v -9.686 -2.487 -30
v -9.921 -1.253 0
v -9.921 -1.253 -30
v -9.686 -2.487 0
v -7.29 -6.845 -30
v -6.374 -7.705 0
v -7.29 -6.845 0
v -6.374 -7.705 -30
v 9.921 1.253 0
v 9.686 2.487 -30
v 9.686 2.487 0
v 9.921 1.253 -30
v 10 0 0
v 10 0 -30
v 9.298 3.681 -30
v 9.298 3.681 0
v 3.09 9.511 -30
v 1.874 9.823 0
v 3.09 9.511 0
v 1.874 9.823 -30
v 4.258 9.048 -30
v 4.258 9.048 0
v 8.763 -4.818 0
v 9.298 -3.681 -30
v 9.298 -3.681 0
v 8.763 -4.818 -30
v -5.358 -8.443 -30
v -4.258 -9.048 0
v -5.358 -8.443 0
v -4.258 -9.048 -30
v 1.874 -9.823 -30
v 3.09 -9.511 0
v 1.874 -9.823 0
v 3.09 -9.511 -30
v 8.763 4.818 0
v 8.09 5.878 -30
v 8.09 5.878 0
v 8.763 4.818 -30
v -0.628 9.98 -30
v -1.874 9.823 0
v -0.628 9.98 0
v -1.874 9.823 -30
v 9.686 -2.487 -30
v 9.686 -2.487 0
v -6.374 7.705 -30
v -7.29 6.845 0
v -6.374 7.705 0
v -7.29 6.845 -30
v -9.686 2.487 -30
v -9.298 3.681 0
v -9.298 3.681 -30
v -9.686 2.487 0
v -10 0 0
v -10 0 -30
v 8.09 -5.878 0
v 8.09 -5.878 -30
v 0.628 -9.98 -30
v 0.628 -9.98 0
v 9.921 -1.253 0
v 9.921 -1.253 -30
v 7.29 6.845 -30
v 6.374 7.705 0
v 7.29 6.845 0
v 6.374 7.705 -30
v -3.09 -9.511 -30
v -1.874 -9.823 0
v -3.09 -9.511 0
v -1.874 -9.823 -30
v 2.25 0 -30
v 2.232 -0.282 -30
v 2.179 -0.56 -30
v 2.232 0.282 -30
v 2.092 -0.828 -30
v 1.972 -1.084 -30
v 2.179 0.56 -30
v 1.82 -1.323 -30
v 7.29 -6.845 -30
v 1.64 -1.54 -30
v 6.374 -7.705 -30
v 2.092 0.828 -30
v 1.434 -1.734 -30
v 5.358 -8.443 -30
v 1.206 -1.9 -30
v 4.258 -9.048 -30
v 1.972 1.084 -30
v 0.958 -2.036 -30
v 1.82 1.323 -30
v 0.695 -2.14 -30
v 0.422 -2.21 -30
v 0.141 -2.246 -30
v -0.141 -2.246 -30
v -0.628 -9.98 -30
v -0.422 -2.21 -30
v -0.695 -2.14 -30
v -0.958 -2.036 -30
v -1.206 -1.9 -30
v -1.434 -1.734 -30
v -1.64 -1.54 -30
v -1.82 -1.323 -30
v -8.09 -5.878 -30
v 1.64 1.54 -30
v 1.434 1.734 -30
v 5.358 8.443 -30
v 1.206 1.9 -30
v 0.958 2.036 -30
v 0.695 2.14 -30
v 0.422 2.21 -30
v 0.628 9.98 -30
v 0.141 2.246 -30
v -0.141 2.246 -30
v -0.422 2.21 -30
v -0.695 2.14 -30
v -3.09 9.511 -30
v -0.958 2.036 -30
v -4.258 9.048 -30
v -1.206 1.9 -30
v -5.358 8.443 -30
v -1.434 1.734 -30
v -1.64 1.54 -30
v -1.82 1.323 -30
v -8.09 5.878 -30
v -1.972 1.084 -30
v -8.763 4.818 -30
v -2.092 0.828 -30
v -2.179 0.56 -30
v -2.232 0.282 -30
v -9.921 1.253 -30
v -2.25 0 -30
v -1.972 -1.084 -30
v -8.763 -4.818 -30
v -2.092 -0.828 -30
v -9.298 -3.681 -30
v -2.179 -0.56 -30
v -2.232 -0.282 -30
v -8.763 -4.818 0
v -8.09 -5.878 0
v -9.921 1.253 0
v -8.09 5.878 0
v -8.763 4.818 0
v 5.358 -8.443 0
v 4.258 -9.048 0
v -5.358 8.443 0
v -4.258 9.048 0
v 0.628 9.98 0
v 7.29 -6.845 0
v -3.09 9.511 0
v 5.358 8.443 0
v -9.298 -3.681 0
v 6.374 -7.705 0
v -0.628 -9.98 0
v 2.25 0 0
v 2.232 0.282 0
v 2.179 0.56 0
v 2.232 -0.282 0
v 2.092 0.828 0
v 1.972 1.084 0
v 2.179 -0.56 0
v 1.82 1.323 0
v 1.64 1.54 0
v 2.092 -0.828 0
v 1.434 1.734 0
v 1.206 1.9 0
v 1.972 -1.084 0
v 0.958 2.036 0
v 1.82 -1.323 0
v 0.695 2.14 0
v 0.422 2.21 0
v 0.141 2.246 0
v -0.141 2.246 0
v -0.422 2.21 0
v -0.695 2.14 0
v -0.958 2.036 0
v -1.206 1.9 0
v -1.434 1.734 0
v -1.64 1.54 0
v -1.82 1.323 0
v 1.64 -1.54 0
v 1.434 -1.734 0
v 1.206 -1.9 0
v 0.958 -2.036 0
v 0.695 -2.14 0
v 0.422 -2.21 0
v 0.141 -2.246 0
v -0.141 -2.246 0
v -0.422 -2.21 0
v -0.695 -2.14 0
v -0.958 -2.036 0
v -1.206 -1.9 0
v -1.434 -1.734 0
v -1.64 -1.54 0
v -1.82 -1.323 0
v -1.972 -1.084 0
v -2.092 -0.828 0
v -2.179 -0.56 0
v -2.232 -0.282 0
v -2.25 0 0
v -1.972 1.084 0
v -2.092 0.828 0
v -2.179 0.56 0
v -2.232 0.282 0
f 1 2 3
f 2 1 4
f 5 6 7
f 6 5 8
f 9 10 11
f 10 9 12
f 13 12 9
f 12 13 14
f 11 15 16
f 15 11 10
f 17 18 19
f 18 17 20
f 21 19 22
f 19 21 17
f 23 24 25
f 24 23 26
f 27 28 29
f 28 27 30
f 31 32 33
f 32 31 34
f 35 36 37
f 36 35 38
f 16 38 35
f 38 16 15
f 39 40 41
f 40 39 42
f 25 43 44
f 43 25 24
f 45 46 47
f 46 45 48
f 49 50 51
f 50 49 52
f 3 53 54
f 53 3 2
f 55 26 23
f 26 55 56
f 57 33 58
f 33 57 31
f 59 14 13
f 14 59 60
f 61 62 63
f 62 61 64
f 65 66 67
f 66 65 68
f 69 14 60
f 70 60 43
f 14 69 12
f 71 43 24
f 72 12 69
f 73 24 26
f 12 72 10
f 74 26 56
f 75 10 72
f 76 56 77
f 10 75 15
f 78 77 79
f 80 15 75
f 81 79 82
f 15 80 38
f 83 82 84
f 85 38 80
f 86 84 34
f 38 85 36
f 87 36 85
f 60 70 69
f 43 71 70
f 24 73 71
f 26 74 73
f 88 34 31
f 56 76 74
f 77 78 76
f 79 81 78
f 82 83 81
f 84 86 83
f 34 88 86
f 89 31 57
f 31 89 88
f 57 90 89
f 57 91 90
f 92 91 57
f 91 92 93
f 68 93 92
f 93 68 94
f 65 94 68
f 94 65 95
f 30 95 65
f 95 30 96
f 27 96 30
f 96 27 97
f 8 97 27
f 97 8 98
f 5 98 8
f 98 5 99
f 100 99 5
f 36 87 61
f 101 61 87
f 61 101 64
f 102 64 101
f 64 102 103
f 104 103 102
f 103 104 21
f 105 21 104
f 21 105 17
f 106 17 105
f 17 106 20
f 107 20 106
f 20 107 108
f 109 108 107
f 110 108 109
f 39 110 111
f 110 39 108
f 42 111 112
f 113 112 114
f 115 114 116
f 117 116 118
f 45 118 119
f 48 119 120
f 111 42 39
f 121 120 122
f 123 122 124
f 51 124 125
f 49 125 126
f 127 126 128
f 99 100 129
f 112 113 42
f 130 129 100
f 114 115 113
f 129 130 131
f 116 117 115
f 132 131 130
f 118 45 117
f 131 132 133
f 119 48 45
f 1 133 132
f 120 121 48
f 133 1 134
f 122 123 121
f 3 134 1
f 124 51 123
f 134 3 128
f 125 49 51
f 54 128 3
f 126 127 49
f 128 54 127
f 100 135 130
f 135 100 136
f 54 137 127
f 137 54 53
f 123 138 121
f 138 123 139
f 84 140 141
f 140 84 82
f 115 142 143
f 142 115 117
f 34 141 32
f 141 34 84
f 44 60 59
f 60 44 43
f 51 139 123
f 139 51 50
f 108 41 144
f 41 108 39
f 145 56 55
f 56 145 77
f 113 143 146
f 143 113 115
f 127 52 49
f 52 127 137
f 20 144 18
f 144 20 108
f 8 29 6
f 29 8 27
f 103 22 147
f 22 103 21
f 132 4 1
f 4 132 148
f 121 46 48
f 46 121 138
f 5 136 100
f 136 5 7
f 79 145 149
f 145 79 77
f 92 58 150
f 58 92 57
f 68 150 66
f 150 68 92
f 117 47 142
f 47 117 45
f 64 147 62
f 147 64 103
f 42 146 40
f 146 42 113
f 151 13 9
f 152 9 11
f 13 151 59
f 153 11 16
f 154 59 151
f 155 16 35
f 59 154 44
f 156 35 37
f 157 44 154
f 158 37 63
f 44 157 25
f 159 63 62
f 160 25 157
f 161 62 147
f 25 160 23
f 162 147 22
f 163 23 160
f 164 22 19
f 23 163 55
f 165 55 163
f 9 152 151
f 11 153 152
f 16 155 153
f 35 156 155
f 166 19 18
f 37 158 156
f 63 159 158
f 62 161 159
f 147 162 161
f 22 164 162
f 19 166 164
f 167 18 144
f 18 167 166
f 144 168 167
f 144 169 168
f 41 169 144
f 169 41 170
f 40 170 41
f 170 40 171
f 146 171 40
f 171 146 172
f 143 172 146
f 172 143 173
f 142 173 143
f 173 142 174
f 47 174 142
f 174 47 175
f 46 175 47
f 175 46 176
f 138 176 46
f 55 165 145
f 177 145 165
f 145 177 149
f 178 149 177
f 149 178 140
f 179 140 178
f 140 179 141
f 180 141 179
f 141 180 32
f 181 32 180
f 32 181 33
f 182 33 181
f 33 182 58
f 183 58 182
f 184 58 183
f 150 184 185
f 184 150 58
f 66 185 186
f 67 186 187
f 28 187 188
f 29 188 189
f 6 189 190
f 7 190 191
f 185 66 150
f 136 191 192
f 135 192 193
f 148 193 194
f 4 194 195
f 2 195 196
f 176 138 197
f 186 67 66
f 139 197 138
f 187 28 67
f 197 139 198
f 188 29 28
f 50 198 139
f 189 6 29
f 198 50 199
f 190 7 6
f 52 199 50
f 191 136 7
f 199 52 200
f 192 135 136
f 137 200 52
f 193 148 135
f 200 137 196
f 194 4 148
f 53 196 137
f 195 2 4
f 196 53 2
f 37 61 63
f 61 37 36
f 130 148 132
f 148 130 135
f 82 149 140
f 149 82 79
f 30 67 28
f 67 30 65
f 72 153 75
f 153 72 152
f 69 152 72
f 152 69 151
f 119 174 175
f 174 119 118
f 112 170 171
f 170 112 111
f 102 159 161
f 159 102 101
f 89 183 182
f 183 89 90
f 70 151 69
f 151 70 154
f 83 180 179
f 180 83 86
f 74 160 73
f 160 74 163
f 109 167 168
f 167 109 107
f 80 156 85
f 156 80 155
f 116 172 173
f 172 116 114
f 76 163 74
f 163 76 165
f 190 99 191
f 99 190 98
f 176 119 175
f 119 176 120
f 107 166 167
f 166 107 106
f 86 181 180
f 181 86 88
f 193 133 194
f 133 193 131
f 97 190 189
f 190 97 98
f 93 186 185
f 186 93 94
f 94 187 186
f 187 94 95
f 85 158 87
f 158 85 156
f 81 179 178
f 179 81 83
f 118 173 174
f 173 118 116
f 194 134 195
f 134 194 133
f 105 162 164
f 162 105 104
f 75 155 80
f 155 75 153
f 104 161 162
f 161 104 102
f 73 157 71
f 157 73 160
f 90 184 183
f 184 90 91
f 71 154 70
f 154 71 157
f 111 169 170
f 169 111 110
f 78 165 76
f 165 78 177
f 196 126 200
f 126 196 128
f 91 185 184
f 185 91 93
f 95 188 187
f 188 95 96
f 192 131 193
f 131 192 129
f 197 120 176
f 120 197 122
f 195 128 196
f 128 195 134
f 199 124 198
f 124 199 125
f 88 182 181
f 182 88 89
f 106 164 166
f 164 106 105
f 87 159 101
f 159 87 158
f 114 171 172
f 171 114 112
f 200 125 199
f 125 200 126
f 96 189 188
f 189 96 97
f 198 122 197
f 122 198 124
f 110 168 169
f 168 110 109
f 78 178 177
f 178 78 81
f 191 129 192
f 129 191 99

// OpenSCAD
$fn = 50;


difference() {
	union() {
		translate(v = [0, 0, -30.0000000000]) {
			cylinder(h = 30, r = 10.0000000000);
		}
	}
	union() {
		#translate(v = [0, 0, -30]) {
			cylinder(h = 30, r = 2.2500000000);
		}
	}
}
